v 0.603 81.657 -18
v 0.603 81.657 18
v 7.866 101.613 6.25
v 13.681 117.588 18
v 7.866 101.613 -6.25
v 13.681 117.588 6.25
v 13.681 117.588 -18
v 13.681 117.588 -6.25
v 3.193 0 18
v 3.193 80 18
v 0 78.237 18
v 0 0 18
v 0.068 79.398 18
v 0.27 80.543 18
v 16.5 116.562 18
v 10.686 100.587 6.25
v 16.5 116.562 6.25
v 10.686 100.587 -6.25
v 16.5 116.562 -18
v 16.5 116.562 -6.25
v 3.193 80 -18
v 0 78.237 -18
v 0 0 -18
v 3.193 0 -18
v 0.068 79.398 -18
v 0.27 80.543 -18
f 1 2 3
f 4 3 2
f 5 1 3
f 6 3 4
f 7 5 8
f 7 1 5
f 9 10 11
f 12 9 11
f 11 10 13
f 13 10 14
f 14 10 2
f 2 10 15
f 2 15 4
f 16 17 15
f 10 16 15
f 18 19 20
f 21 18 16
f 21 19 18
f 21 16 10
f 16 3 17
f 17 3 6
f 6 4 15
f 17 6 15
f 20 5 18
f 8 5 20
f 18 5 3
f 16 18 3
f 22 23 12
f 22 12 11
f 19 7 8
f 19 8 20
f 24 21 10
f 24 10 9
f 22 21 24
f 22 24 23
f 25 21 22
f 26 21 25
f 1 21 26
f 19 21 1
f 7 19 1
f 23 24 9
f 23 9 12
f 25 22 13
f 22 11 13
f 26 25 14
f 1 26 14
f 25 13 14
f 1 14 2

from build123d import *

# Parameters (mm, degrees)
BOSS_EXTRU_1_DEPTH      = 18
BOSS_EXTRU_1_DEPTH_BACK = 18
CONG_1_R                = 10
ESQUISSE2_W             = 12.5
ESQUISSE2_H             = 17
ENL_V_MAT_EXTRU_1_DEPTH = 3


with BuildPart() as part:
    # Esquisse1 → Boss.-Extru.1 (new, two sides: drawn at the far end of the back side and taken through both)
    with BuildSketch(Plane.XY.offset(-BOSS_EXTRU_1_DEPTH_BACK)):
        Polygon((0, 0), (0, 80), (13.680805733, 117.587704831), (16.499883595, 116.561644401), (3.192533317, 80), (3.192533317, 0), align=None)
    extrude(amount=BOSS_EXTRU_1_DEPTH + BOSS_EXTRU_1_DEPTH_BACK)

    # Congé1
    cong_1_edges = [part.edges().sort_by_distance(p)[0] for p in [
        (0, 80, 0),
    ]]
    fillet(cong_1_edges, radius=CONG_1_R)

    # Esquisse2 → Enlèv. mat.-Extru.1 (cut)
    with BuildSketch(Plane(origin=(-25.711504387, 9.358222275, 0), x_dir=(0, 0, 1), z_dir=(-0.9396926207859093, 0.34202014332566644, 0))):
        with Locations((0, 106.675409663)):
            Rectangle(ESQUISSE2_W, ESQUISSE2_H)
    extrude(amount=-ENL_V_MAT_EXTRU_1_DEPTH, mode=Mode.SUBTRACT)


solid = part.part
